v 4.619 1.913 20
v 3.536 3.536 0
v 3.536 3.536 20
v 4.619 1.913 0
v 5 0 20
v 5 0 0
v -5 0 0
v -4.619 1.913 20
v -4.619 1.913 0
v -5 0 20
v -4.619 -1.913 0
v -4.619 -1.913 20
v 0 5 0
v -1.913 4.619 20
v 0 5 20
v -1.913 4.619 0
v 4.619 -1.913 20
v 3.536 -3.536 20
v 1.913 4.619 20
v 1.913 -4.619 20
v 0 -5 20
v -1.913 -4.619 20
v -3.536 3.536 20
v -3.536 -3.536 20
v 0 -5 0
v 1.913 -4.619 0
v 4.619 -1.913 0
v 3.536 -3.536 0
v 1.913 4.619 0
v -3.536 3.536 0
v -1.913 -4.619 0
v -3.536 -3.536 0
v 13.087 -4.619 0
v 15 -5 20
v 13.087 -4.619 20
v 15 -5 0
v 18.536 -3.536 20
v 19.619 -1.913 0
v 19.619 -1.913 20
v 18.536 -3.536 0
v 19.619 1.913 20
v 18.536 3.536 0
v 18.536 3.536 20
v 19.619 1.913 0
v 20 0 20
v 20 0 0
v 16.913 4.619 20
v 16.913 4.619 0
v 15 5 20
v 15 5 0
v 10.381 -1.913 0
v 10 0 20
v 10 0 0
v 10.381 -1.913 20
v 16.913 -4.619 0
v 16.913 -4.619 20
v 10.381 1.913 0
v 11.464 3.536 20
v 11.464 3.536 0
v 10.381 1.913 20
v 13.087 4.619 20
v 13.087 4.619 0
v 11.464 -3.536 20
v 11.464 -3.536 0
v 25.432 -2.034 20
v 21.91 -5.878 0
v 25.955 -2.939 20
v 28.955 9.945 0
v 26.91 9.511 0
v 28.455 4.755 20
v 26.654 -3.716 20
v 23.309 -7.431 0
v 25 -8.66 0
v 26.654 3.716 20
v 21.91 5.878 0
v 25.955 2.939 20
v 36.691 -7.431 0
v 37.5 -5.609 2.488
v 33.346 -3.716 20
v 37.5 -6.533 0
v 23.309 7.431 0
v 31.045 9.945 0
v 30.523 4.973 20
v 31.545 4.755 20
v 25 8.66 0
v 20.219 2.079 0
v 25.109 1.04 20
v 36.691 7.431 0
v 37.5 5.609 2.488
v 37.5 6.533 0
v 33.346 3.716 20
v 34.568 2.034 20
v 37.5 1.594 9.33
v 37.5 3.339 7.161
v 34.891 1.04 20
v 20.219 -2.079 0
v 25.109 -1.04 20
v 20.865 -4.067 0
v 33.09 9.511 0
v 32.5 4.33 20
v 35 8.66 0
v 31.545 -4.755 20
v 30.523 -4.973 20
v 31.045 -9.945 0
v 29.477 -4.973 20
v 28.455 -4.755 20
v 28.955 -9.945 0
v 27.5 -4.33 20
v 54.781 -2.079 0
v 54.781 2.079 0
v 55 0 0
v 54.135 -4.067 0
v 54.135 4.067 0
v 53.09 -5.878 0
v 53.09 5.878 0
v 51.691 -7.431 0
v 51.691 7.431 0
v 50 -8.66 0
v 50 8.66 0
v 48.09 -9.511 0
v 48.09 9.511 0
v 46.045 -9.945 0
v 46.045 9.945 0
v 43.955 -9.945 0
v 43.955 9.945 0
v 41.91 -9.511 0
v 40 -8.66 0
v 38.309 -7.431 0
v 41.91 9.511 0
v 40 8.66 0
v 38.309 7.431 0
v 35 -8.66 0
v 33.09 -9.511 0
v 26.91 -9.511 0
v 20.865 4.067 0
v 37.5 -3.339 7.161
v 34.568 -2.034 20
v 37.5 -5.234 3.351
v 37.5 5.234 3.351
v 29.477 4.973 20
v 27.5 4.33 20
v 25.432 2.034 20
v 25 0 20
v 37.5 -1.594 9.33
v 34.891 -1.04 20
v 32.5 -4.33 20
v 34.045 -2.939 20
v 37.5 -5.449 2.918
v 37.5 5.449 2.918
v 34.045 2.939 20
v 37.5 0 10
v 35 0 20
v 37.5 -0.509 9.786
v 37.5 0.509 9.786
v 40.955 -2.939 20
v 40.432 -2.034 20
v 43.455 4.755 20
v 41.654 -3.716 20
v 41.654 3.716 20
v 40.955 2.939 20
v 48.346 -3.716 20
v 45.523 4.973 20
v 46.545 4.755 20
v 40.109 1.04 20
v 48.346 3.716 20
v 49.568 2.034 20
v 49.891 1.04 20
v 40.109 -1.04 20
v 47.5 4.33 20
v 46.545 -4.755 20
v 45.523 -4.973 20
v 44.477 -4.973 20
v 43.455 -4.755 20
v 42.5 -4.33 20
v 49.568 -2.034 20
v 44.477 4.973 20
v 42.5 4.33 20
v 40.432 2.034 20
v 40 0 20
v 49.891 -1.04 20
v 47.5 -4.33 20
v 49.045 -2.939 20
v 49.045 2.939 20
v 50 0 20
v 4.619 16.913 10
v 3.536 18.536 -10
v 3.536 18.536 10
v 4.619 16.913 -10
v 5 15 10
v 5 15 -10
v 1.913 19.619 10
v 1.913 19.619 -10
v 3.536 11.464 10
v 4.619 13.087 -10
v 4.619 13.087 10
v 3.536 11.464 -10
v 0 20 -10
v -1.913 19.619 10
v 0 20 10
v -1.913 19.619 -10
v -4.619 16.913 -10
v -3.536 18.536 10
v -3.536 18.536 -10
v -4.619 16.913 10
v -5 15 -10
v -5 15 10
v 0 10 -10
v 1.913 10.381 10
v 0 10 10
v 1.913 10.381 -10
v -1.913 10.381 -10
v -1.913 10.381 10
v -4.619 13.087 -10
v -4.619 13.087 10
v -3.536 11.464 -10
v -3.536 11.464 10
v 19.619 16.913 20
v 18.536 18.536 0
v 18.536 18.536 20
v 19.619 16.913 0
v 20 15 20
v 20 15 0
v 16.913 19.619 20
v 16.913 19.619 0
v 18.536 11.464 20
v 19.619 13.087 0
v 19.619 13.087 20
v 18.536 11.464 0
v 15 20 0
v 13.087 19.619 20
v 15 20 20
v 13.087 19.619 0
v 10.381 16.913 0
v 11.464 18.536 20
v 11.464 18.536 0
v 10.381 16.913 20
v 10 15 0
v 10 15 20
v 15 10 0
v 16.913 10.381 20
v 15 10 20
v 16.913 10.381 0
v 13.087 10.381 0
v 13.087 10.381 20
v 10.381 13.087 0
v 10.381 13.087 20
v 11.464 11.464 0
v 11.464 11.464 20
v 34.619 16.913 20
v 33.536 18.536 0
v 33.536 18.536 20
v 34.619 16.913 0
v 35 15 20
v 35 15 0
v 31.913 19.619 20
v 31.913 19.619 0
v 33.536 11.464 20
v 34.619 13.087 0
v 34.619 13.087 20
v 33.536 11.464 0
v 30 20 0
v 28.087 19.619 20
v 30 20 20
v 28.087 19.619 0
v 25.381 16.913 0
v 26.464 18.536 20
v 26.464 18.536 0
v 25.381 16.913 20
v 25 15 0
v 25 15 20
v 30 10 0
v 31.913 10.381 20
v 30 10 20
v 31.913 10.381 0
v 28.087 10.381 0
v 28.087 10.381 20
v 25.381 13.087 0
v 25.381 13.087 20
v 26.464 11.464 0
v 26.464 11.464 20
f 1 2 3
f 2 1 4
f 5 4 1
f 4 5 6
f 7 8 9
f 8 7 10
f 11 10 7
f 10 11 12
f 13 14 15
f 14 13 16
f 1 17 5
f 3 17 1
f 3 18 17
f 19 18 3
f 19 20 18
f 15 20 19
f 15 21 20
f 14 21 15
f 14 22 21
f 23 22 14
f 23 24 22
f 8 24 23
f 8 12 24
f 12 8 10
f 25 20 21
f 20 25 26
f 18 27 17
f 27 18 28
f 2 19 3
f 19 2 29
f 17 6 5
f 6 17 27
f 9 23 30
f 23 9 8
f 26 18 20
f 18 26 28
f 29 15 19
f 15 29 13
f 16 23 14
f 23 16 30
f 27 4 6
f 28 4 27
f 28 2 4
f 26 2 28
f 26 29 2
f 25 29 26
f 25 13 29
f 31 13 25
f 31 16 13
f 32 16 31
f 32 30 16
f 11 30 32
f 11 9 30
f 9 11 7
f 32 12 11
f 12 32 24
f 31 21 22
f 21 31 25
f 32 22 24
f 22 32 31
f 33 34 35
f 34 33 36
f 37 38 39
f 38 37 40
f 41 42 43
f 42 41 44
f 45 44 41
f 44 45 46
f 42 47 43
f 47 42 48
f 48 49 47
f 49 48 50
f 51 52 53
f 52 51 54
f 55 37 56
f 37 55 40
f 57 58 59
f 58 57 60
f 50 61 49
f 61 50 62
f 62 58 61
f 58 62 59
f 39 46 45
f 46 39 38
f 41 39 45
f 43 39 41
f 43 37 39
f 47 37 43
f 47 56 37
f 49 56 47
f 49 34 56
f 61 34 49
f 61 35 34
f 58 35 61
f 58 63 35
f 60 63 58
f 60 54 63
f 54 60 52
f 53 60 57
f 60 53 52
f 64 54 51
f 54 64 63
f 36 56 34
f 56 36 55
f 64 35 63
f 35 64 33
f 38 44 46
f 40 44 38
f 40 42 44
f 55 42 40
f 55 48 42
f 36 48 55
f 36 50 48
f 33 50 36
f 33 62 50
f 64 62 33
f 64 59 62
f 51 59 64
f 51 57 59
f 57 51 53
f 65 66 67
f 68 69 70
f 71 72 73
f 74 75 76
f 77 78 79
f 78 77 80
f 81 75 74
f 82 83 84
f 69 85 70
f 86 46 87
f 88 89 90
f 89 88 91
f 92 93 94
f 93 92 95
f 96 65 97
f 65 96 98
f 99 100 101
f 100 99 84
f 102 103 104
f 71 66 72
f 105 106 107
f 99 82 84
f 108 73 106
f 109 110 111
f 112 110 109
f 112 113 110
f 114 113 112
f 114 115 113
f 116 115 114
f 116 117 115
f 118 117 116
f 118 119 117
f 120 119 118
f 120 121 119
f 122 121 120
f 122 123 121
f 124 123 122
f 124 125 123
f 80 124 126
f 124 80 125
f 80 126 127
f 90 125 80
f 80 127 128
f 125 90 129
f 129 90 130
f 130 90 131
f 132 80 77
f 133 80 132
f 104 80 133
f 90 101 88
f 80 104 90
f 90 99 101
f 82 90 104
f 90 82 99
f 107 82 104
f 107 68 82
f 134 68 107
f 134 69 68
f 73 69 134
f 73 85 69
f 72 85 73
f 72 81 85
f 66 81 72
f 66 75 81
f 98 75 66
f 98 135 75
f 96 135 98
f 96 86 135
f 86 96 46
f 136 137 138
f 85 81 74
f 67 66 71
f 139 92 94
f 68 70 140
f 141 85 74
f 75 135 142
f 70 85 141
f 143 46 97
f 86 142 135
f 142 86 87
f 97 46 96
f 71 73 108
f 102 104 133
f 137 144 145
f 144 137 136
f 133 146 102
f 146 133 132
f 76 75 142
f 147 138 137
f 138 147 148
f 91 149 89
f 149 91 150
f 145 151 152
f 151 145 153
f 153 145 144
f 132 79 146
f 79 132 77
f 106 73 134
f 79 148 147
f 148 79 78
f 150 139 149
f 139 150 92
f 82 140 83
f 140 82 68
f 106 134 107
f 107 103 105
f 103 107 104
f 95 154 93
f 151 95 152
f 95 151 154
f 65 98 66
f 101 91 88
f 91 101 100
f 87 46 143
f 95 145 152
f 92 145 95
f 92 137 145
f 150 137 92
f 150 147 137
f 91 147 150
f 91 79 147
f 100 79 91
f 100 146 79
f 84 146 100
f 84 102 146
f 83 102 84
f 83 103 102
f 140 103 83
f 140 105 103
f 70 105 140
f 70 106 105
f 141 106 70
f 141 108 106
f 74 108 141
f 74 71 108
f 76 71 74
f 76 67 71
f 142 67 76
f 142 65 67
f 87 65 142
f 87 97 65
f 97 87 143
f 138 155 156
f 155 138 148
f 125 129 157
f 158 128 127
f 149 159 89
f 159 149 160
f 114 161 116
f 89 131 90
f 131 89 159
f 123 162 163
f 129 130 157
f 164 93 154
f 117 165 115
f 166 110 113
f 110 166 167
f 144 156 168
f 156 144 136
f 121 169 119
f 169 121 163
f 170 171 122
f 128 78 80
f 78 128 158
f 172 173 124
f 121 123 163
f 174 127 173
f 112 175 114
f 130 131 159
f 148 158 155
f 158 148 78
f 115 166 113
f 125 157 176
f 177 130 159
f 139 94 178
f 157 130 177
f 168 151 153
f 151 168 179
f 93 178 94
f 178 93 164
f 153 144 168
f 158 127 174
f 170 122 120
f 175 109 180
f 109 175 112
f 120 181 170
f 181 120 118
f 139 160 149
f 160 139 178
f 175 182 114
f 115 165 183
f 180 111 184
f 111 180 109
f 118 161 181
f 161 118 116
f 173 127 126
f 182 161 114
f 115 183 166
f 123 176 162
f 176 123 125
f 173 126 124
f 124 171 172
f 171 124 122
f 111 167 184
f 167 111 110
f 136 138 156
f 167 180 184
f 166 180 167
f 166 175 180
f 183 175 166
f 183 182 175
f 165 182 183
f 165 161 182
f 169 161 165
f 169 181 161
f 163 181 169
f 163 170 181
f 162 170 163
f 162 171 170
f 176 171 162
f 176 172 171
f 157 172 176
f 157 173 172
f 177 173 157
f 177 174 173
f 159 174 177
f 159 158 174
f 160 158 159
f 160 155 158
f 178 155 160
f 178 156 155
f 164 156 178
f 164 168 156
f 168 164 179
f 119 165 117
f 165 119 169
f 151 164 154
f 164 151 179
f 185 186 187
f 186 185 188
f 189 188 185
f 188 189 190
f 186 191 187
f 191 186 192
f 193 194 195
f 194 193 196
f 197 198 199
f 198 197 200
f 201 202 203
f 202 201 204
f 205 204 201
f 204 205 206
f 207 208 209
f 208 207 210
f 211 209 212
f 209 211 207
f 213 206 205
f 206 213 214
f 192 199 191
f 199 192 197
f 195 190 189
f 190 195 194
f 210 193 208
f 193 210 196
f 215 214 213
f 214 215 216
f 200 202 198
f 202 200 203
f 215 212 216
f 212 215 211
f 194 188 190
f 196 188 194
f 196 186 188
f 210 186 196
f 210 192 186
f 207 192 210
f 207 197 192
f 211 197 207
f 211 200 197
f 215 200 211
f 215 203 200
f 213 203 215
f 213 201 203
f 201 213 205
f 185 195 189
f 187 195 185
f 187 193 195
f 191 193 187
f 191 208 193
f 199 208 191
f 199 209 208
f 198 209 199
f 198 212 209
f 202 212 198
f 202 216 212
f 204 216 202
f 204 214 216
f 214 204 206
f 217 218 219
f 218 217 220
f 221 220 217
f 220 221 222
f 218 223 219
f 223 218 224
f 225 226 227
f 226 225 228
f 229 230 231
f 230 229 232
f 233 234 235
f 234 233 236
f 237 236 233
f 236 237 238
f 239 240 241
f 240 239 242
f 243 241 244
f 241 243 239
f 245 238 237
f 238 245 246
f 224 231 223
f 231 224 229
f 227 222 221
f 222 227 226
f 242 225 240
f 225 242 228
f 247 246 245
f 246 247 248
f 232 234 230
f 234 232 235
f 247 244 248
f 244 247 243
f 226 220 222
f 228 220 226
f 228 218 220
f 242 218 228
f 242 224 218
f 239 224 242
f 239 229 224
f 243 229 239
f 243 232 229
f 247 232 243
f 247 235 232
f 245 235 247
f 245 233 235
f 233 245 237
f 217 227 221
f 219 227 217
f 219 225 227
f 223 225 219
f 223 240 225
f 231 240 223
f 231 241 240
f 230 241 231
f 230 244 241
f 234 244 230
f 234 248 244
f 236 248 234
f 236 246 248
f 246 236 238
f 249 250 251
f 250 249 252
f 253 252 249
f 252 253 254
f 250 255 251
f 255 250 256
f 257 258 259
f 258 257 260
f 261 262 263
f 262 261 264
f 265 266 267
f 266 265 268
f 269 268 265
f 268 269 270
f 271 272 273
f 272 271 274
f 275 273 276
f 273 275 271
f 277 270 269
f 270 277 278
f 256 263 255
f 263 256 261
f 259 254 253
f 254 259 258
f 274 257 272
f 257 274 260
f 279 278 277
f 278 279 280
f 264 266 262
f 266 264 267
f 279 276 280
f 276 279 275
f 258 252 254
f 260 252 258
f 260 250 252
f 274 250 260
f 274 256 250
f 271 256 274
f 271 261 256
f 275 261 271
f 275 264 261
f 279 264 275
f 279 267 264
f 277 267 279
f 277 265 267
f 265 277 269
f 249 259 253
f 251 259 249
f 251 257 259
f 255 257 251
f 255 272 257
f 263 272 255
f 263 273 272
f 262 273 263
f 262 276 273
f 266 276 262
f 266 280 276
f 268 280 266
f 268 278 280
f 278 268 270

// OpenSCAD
// Cylinder variant tests
union() {
    cylinder(h=20, r=5);
    translate([15, 0, 0]) cylinder(h=20, r=5);
    translate([30, 0, 0]) cylinder(h=20, r1=10, r2=5);
    translate([45, 0, 0]) cylinder(h=20, r1=10, r2=5);
    translate([0, 15, 0]) cylinder(h=20, r=5, center=true);
    translate([15, 15, 0]) cylinder(h=20, r=5);
    translate([30, 15, 0]) cylinder(h=20, r=5);
}
